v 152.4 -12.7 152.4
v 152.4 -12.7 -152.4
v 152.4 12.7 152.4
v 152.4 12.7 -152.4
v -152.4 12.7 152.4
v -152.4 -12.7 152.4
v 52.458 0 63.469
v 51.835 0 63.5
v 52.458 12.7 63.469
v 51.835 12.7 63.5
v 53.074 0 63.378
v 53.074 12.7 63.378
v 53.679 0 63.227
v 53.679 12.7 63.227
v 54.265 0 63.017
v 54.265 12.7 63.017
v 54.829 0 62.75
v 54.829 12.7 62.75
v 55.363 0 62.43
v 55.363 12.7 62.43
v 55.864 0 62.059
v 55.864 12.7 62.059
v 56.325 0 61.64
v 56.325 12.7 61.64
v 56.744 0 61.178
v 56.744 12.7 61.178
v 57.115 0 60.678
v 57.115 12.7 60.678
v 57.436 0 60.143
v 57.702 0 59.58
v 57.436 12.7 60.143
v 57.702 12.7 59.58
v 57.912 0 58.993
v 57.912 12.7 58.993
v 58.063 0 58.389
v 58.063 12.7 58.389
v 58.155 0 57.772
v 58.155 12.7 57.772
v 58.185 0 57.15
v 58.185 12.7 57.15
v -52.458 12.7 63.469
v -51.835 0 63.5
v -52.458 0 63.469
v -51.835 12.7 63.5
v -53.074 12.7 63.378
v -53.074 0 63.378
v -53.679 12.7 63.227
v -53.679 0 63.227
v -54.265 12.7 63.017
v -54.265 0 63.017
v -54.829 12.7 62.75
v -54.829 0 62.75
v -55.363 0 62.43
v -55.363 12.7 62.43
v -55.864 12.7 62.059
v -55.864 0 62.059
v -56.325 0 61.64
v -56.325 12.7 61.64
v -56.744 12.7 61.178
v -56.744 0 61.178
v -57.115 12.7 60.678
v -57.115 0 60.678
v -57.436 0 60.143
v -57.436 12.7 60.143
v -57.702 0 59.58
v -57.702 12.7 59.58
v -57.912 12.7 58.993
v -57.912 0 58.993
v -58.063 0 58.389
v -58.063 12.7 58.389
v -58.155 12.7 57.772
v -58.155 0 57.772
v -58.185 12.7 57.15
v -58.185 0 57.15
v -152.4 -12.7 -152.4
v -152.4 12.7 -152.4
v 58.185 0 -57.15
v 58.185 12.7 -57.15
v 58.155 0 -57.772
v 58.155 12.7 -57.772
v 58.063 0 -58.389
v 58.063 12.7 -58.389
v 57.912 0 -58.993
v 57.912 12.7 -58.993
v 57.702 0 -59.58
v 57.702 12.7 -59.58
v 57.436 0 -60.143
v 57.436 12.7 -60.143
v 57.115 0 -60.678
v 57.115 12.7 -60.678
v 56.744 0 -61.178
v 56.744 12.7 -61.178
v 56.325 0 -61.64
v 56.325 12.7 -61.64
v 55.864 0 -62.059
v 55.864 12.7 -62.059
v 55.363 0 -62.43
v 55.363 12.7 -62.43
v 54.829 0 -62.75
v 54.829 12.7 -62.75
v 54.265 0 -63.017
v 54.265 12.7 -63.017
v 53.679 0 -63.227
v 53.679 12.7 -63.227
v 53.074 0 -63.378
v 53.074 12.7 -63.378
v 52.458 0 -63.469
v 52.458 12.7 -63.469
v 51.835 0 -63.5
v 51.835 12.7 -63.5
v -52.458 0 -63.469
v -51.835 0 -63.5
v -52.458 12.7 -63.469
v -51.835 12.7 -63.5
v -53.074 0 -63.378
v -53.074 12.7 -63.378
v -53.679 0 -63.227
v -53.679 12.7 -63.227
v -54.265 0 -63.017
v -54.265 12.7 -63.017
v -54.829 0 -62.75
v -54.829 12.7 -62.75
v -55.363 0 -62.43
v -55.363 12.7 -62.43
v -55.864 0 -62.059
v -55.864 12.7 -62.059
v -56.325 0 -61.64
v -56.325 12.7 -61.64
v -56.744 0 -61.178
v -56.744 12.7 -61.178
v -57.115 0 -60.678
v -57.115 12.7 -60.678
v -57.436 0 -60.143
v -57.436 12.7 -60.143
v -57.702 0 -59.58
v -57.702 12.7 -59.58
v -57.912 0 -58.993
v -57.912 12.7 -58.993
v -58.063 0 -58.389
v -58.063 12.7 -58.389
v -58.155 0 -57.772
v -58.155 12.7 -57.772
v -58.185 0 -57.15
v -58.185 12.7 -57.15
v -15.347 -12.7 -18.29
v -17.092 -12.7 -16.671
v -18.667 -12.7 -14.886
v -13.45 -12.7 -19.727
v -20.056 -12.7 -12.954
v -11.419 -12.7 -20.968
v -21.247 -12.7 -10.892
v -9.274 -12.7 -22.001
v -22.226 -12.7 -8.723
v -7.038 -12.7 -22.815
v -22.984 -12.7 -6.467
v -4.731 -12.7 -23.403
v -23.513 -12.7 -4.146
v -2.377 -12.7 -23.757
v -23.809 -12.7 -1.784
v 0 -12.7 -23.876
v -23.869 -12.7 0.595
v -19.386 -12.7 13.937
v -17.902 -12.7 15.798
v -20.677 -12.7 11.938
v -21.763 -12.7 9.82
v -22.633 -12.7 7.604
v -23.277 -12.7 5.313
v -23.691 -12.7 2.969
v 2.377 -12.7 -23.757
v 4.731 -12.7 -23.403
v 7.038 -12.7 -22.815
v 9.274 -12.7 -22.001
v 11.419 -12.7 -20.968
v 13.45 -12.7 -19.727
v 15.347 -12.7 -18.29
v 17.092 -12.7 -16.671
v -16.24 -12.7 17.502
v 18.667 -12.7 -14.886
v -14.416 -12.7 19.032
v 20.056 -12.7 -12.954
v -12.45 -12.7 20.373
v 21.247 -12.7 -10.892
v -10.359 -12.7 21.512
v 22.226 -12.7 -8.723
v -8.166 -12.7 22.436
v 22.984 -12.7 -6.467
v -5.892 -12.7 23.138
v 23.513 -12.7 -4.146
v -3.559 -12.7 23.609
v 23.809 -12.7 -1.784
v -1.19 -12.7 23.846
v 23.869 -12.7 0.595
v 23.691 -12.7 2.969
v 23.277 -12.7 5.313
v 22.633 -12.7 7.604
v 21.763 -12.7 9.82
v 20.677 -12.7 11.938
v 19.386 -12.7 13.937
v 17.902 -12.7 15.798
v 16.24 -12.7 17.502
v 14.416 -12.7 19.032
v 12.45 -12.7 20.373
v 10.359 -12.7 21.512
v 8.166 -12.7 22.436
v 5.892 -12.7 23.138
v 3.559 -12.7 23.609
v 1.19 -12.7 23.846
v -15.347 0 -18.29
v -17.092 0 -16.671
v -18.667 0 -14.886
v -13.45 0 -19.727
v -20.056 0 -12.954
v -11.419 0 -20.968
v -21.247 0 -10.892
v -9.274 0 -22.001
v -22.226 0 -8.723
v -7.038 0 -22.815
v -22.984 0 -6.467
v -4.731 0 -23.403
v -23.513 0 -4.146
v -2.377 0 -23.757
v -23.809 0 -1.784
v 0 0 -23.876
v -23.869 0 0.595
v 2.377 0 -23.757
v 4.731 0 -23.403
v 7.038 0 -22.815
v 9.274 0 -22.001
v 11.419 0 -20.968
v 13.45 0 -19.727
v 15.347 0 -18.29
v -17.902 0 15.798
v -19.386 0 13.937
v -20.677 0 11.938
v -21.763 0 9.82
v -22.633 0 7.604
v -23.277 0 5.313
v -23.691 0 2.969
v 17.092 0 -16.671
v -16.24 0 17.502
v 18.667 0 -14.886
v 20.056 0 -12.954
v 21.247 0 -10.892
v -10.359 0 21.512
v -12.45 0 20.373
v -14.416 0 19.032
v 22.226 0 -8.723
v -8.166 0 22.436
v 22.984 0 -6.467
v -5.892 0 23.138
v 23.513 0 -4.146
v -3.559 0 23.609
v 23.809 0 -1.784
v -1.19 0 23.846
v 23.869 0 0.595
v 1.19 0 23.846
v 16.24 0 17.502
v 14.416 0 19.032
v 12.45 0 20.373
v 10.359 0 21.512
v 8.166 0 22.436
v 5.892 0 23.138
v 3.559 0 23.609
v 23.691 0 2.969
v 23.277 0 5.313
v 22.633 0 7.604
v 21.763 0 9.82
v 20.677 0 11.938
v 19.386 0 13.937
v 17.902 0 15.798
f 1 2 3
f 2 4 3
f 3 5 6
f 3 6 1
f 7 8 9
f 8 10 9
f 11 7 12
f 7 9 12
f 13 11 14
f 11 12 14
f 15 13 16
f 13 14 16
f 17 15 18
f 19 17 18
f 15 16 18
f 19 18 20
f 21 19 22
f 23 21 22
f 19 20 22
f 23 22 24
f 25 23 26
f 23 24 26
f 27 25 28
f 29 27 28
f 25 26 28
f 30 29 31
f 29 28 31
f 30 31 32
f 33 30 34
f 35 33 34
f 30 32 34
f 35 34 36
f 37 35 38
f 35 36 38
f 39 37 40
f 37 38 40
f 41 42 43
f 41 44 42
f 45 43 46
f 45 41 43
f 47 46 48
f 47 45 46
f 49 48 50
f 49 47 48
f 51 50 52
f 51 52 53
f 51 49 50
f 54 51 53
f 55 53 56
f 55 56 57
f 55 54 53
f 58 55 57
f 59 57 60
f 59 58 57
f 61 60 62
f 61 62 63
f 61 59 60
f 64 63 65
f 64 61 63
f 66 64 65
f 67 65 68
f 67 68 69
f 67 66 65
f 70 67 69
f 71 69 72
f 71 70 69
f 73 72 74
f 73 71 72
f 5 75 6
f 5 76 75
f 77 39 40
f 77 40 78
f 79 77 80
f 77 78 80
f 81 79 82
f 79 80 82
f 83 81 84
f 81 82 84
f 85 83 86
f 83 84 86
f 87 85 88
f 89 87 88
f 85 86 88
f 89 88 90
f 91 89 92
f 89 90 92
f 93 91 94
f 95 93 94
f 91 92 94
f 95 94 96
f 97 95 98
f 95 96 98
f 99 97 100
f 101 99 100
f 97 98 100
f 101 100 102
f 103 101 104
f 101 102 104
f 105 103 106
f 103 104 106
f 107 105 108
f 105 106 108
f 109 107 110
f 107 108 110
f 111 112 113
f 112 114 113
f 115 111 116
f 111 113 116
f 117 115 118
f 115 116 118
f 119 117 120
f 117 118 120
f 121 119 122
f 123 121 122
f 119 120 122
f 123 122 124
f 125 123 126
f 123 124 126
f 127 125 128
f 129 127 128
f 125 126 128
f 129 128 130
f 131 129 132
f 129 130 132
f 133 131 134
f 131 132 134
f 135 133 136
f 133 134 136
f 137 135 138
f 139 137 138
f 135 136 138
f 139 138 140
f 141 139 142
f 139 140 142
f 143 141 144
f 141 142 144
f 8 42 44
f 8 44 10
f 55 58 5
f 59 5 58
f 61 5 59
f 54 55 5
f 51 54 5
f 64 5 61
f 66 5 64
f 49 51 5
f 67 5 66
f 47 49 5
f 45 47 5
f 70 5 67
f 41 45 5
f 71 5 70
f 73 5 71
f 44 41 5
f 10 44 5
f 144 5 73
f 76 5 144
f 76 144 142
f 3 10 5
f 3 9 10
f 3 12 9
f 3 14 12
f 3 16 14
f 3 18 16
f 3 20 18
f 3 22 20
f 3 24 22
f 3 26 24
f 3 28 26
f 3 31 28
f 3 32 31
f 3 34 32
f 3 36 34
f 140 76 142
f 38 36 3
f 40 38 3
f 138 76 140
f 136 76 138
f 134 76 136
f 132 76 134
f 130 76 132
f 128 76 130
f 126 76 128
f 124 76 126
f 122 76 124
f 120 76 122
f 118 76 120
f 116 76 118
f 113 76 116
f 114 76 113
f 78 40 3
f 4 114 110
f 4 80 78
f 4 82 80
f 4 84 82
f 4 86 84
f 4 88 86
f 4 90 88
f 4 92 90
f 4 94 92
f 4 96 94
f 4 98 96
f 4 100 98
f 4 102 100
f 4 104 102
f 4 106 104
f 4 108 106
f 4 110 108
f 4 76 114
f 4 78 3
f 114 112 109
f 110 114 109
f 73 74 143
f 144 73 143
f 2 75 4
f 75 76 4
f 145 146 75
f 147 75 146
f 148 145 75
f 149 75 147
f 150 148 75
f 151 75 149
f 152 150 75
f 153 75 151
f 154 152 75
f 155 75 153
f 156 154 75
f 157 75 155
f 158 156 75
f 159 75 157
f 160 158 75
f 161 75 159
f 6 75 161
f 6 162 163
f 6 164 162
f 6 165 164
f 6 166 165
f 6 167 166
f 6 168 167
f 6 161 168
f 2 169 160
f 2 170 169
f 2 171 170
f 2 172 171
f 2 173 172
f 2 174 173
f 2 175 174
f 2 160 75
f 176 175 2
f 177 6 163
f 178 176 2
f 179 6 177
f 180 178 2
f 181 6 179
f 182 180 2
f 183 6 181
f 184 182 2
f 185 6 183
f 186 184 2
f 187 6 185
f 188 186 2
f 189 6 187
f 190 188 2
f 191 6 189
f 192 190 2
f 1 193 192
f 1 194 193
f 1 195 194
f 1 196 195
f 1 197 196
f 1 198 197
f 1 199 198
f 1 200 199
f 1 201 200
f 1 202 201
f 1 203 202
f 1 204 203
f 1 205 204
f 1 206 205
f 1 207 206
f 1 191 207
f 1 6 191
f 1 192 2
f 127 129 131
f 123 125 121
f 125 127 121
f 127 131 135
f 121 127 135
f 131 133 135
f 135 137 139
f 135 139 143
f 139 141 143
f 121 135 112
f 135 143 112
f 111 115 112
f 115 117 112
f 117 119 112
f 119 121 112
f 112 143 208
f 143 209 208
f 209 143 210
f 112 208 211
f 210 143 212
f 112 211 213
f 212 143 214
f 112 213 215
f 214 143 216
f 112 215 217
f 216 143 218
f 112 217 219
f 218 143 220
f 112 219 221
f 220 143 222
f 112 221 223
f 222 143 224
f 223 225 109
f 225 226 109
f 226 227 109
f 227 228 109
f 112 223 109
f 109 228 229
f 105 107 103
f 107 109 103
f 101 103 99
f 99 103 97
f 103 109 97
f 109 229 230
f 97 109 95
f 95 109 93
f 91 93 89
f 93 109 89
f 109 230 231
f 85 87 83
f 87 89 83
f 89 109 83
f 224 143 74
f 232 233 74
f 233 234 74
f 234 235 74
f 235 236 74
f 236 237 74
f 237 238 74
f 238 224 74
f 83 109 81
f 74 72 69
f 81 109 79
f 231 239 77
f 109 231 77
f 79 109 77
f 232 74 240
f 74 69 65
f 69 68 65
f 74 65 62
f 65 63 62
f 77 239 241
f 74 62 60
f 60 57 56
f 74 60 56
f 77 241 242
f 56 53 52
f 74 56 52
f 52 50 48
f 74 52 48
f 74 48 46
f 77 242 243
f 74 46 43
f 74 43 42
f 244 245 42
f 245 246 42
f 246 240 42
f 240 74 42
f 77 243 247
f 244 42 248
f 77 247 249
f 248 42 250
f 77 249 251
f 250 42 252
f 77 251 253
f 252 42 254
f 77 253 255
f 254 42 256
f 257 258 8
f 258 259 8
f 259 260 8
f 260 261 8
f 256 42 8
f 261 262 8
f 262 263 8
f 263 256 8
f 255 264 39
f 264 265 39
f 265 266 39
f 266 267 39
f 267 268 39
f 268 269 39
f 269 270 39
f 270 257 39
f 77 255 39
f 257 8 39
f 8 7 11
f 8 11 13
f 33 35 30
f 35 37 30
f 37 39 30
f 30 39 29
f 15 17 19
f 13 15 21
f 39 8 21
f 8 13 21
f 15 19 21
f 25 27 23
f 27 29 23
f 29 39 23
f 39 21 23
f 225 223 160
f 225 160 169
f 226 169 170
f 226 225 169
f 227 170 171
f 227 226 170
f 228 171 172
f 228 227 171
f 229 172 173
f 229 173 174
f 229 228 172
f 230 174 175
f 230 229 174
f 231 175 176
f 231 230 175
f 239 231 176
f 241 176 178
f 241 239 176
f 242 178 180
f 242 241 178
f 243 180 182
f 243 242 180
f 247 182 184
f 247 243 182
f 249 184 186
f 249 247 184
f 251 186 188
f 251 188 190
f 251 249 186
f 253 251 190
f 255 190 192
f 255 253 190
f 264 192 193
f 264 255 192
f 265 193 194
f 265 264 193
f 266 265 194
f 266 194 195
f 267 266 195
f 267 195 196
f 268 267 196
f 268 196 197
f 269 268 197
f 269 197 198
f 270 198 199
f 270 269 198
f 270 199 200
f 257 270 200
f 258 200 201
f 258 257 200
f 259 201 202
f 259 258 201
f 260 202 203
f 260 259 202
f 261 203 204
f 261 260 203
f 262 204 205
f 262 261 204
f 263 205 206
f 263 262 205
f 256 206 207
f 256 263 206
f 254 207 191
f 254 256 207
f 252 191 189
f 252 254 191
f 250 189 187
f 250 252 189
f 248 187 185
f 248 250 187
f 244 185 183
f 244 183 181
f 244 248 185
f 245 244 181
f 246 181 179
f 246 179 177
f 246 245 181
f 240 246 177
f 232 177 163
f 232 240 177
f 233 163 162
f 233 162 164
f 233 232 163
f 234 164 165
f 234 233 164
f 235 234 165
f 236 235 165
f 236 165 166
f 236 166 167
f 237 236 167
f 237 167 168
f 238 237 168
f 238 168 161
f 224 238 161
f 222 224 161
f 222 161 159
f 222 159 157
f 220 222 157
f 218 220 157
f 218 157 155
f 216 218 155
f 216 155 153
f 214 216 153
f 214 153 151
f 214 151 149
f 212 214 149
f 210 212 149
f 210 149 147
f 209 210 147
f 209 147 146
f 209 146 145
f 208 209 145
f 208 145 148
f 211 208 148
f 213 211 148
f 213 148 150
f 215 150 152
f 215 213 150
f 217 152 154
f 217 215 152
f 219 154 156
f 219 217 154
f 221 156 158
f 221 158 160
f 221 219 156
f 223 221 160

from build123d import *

# Parameters (mm, degrees)
SKETCH1_W                = 304.8
SKETCH1_H                = 304.8
SKETCH1_W_2              = 116.370630768
SKETCH1_H_2              = 127
SHEET_METAL_CUTOUT_DEPTH = 12.7
CUTOUT_FILLET_R          = 6.35
SKETCH2_W                = 304.8
SKETCH2_H                = 304.8
SKETCH2_R                = 23.876
BOSS_EXTRUDE2_DEPTH      = 12.7


with BuildPart() as part:
    # Sketch1 → Sheet metal cutout (new body)
    with BuildSketch(Plane(origin=(0, 0, 0), x_dir=(1, 0, 0), z_dir=(0, 1, 0))):
        Rectangle(SKETCH1_W, SKETCH1_H)
        Rectangle(SKETCH1_W_2, SKETCH1_H_2, mode=Mode.SUBTRACT)
    extrude(amount=SHEET_METAL_CUTOUT_DEPTH)

    # cutout fillet
    cutout_fillet_edges = [part.edges().sort_by_distance(p)[0] for p in [
        (58.185315384, 6.35, 63.5),
        (58.185315384, 6.35, -63.5),
        (-58.185315384, 6.35, -63.5),
        (-58.185315384, 6.35, 63.5),
    ]]
    fillet(cutout_fillet_edges, radius=CUTOUT_FILLET_R)

    # Sketch2 → Boss-Extrude2 (add)
    with BuildSketch(Plane.XZ):
        Rectangle(SKETCH2_W, SKETCH2_H)
        with Locations(Location((0, 0, 0), (0, 0, 270))):
            Circle(SKETCH2_R, mode=Mode.SUBTRACT)
    extrude(amount=BOSS_EXTRUDE2_DEPTH)


solid = part.part
